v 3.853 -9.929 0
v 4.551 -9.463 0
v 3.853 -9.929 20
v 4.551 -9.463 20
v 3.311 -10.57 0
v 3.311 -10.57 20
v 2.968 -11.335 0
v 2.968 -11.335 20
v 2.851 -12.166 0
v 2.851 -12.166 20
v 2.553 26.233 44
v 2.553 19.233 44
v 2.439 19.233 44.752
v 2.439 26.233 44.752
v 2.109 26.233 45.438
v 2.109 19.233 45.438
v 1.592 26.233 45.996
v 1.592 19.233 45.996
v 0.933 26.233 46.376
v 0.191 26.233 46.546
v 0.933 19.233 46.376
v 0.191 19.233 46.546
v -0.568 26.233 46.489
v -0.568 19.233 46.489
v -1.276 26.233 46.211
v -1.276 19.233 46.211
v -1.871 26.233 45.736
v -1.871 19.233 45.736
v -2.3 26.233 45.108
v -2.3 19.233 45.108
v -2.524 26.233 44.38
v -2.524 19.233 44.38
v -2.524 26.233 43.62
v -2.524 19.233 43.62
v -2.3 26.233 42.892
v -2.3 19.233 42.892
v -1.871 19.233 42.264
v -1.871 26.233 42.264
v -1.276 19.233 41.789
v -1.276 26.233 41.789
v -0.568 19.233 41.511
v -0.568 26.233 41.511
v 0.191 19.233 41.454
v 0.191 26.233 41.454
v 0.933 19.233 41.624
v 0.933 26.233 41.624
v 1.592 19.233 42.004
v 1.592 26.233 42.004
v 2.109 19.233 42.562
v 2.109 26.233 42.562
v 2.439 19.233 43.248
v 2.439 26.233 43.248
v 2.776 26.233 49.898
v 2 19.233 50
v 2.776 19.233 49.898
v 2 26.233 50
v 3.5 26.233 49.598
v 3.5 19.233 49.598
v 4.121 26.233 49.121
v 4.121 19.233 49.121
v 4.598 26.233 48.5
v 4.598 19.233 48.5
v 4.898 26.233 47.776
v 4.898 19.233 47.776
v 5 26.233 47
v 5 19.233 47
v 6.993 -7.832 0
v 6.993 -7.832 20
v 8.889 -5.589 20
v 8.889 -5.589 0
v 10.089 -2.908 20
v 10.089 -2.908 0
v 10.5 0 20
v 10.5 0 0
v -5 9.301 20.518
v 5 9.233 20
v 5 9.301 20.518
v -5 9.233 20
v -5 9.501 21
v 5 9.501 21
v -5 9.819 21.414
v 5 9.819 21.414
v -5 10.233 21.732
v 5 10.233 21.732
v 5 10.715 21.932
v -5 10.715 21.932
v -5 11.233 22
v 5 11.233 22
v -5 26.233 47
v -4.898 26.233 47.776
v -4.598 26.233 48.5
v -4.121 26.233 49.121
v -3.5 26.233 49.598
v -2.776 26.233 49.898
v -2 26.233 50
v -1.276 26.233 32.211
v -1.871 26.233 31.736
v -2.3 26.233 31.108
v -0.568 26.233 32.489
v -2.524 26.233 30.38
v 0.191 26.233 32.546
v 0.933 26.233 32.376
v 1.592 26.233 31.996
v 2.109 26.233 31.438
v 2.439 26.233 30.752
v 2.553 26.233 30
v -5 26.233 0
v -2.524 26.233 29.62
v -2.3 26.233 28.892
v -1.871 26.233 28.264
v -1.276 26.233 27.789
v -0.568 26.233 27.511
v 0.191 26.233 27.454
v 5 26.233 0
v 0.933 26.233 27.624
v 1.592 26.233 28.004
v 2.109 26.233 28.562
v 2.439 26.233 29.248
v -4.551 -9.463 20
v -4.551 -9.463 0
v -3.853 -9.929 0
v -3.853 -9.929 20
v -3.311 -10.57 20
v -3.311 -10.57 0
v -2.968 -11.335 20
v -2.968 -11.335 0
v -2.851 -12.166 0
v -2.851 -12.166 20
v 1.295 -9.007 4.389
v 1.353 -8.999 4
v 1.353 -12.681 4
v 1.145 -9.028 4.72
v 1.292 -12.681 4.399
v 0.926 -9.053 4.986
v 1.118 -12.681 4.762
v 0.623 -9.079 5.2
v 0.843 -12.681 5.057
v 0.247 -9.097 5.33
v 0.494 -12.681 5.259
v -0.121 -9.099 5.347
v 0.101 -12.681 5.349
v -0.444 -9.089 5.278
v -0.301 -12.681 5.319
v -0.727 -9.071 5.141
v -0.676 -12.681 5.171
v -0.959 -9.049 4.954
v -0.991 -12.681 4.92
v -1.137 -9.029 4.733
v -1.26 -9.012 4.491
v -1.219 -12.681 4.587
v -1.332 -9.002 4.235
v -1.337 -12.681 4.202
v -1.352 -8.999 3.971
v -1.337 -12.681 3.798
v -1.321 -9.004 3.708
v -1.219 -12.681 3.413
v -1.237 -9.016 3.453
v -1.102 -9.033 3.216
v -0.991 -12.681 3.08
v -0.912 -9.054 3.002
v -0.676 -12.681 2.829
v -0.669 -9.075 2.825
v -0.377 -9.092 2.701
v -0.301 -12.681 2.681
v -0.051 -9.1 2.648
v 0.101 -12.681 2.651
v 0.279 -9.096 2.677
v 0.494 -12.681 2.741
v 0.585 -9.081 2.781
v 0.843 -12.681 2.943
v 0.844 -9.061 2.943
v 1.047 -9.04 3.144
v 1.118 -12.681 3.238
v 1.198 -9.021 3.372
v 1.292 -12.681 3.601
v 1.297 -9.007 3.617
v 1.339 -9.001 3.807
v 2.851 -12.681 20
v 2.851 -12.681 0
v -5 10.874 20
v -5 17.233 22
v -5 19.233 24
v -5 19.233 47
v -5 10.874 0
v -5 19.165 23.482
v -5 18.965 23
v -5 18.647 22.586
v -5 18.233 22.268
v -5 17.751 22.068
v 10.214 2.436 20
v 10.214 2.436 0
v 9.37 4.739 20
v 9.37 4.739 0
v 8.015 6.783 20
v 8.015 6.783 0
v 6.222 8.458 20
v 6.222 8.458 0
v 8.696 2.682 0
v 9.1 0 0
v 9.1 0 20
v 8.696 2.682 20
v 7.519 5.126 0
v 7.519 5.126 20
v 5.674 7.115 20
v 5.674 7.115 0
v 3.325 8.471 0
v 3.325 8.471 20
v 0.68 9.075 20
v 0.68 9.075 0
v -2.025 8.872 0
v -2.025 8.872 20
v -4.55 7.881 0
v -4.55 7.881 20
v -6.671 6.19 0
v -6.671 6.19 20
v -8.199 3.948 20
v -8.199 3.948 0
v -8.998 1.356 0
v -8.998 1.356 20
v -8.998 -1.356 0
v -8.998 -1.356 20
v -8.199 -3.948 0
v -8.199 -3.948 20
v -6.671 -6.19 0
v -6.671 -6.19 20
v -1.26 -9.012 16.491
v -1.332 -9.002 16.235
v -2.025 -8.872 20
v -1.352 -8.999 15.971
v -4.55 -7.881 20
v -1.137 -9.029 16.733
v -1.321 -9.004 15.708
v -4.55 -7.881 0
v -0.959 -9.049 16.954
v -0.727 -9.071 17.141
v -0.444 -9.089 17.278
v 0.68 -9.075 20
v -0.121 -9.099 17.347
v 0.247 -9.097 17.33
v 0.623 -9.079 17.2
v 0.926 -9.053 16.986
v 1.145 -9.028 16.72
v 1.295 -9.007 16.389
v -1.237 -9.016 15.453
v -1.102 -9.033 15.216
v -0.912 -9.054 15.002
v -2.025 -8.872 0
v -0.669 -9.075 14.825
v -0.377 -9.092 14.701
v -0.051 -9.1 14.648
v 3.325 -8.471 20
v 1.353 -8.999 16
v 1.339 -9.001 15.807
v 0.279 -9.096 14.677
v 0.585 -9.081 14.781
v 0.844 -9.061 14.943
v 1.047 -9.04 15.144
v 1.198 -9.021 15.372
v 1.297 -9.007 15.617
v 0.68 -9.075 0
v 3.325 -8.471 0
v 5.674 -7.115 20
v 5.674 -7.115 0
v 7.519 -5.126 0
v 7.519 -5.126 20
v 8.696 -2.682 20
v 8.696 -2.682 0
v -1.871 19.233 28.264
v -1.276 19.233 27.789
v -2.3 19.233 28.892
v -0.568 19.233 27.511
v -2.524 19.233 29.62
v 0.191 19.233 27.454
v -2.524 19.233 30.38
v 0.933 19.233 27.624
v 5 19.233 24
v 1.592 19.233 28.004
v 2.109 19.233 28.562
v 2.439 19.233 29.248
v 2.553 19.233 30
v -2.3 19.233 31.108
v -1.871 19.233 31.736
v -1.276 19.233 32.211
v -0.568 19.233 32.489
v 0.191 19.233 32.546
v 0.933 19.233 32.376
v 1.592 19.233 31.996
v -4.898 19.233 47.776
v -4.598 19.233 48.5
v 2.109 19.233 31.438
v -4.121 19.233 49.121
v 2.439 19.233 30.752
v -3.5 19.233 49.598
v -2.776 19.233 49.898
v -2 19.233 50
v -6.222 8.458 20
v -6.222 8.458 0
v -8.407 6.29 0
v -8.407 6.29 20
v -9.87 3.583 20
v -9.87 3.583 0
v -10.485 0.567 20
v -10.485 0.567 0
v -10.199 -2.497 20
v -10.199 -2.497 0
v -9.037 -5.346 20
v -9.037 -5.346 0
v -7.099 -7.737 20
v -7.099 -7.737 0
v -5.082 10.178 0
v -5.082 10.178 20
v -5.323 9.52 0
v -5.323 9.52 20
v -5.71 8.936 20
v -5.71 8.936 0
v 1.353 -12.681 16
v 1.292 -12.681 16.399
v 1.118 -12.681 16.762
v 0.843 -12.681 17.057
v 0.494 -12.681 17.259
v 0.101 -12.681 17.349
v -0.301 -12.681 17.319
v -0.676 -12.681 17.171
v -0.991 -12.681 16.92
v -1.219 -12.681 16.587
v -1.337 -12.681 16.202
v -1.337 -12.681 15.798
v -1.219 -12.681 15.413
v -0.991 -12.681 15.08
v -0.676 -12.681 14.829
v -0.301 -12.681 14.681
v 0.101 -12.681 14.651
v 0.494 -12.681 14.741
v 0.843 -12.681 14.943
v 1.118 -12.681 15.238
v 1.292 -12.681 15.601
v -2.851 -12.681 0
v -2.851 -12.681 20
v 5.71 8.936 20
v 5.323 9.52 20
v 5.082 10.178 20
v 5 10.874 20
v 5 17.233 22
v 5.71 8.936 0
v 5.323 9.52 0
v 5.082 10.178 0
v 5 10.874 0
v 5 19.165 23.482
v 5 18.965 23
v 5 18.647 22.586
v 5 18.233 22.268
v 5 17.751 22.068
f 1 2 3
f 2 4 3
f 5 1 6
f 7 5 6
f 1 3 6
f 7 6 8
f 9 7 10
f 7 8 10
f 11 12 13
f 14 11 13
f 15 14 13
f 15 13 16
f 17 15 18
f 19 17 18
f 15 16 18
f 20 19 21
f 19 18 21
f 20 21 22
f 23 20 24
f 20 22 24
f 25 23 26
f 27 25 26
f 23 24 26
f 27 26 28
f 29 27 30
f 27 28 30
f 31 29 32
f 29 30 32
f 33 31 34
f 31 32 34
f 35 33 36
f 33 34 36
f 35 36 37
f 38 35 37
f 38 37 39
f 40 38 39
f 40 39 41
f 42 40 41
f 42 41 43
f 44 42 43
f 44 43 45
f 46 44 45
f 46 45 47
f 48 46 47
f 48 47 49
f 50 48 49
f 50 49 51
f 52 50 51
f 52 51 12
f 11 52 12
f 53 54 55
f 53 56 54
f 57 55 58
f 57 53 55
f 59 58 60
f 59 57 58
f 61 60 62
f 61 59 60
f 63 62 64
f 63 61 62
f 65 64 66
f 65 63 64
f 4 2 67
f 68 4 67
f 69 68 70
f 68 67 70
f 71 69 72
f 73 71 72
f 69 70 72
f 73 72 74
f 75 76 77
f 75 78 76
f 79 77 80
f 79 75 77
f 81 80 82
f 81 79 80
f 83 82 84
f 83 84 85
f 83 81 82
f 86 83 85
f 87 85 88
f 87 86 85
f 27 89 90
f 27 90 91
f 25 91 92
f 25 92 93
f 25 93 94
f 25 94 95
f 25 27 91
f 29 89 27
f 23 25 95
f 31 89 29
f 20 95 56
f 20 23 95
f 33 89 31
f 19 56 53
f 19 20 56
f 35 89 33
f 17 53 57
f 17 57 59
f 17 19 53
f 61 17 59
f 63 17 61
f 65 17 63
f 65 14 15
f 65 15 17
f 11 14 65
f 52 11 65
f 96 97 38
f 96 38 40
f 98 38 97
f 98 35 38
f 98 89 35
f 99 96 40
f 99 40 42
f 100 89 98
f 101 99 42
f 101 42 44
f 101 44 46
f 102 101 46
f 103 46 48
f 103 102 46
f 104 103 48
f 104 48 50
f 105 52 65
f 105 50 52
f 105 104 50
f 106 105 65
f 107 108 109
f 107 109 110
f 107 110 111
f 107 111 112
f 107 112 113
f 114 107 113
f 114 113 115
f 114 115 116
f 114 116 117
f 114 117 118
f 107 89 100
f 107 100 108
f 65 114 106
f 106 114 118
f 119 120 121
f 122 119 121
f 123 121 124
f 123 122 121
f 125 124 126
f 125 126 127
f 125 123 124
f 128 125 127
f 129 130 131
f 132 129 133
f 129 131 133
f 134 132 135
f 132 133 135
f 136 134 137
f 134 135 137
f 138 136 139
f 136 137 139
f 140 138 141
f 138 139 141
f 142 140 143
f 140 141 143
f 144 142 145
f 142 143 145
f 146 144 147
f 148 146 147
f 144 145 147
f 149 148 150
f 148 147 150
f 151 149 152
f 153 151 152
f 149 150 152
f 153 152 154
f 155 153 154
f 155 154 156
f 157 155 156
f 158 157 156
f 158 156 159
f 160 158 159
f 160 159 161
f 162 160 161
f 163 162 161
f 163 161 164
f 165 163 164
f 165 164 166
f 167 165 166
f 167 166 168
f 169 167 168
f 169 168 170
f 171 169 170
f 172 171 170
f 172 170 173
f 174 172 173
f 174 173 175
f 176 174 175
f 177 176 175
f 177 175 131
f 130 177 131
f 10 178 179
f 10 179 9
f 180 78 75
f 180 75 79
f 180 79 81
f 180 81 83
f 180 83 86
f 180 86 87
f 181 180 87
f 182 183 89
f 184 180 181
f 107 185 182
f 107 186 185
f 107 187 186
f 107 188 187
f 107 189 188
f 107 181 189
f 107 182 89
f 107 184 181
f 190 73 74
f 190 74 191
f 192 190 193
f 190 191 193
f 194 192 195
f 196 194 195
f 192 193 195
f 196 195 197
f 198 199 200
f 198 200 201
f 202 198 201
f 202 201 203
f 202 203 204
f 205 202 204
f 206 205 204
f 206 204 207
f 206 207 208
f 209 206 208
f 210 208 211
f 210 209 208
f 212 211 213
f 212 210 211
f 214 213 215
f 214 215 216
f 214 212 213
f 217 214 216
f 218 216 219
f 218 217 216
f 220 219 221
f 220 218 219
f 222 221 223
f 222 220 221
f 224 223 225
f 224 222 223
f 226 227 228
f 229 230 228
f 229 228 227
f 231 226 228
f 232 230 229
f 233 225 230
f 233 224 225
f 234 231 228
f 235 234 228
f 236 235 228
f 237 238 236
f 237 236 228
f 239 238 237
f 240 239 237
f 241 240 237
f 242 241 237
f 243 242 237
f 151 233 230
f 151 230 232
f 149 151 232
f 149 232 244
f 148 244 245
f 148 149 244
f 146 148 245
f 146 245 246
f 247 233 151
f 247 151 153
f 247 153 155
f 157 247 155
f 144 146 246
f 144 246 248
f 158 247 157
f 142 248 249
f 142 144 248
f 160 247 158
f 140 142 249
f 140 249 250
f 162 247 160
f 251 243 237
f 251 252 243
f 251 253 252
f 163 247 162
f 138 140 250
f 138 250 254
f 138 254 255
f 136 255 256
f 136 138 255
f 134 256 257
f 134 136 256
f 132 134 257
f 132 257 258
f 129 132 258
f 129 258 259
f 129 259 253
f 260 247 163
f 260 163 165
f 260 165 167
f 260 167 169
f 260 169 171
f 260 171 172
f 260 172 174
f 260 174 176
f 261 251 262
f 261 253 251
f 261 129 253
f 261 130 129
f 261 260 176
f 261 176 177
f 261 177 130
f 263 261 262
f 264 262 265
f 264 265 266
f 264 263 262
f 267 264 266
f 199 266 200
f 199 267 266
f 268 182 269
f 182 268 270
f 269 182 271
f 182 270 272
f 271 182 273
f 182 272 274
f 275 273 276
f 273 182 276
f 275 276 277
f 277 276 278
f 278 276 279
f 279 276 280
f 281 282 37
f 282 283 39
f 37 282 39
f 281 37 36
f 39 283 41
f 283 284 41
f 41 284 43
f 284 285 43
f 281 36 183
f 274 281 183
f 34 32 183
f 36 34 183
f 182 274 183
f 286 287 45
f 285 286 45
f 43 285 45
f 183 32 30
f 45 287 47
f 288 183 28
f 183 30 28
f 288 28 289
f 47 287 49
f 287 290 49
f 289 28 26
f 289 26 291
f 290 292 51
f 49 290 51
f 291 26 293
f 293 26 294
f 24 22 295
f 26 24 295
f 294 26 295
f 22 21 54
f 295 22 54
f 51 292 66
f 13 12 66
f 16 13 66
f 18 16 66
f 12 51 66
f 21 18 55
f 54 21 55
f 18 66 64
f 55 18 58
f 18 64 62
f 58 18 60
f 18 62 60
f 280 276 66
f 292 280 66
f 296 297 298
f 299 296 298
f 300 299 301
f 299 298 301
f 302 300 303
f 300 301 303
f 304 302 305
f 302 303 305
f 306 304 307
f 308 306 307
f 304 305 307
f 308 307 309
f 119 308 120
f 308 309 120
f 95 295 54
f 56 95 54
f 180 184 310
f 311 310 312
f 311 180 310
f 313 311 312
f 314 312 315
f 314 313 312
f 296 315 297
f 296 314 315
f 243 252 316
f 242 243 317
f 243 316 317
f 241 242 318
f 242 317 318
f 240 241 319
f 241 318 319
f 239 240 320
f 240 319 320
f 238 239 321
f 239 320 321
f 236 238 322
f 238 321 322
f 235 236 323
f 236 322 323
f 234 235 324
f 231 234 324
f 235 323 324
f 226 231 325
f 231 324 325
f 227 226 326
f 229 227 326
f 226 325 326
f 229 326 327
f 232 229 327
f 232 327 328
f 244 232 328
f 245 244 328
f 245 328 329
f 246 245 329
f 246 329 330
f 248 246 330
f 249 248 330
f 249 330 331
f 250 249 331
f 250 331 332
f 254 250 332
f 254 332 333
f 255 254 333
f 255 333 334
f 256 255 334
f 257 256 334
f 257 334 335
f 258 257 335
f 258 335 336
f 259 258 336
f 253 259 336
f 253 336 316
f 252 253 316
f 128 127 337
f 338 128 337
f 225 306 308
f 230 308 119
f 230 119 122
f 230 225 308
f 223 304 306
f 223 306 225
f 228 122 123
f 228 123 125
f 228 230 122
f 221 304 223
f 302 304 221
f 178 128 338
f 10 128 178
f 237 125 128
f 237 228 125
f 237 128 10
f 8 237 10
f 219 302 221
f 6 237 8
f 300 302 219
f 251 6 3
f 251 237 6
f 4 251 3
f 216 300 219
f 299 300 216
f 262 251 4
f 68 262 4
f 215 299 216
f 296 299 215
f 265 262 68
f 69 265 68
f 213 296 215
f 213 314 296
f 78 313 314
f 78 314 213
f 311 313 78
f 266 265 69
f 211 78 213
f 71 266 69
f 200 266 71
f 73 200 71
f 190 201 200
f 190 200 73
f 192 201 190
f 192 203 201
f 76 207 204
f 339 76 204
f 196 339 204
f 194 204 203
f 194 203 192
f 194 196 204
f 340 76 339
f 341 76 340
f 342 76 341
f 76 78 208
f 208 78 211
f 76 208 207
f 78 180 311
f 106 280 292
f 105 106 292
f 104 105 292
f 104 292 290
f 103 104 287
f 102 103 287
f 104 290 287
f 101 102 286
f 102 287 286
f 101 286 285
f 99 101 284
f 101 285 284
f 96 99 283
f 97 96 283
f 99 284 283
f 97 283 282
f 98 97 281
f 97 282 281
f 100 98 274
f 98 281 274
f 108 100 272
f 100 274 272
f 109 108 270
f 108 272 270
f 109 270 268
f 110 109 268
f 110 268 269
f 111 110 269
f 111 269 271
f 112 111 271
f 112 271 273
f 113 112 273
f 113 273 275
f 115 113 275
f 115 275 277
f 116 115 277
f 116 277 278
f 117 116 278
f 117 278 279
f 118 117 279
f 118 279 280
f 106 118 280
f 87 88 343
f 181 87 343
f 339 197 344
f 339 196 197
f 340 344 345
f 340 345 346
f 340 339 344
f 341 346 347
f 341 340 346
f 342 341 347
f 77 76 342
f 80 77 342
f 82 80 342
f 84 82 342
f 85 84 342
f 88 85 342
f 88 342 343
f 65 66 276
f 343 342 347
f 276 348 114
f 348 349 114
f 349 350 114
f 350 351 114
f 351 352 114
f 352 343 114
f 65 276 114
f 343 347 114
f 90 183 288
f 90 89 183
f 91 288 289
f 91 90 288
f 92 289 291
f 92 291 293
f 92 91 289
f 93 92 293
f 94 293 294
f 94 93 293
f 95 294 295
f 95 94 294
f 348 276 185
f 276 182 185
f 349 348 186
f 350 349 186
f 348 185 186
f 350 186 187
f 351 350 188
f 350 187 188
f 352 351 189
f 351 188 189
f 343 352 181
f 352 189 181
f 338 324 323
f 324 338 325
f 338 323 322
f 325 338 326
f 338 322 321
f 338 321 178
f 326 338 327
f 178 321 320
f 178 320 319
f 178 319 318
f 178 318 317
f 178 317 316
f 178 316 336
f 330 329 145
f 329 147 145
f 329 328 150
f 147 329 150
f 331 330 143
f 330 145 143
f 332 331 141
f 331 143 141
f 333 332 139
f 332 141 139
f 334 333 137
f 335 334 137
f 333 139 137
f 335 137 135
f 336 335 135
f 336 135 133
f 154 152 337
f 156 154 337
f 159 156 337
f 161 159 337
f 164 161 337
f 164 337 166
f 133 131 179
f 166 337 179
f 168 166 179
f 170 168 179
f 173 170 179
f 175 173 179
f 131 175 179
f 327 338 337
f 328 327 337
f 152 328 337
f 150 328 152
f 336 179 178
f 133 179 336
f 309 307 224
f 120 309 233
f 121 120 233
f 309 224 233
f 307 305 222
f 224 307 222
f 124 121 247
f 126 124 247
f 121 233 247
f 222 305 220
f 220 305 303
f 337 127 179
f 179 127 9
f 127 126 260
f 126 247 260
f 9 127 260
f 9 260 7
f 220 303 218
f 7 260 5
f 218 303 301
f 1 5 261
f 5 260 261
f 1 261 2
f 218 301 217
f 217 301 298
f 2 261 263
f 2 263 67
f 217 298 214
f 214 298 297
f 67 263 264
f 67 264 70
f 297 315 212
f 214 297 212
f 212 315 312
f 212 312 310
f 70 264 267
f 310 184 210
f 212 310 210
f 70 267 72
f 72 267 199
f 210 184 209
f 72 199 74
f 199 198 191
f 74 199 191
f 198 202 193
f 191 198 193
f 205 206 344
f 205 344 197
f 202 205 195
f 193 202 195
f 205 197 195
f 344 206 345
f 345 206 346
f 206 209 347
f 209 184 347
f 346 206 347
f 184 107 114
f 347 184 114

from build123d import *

# Parameters (mm, degrees)
F0_R      = 9.1
F1_DEPTH  = 20
F2_W      = 10
F2_H      = 17
F3_DEPTH  = 30
F4_W      = 10
F4_H      = 28
F5_DEPTH  = 25.4
F6_R      = 3
F7_R      = 1.99999
F8_R      = 2.5527
F9_DEPTH  = 7.001
F10_R     = 1.35255
F11_DEPTH = 3.6831519111


# Not quite as in the source:
# - a fillet or chamfer is up to 0.001 mm smaller than in the source, because OpenCascade refuses the exact size


with BuildPart() as f1:
    # F0 (on Top) → F1 (new body)
    with BuildSketch(Plane.XY):
        with BuildLine():
            ThreePointArc((2.8507034294, -10.1056167529), (8.3720483159, -6.3370976792), (10.5, 0))
            ThreePointArc((10.5, 0), (9.0208092763, 5.3735463151), (5, 9.2330926563))
            Line((5, 9.2330926563), (-5, 9.2330926563))
            ThreePointArc((-5, 9.2330926563), (-10.4357465707, -1.1598247764), (-2.8507034294, -10.1056167529))
            Line((-2.8507034294, -10.1056167529), (2.8507034294, -10.1056167529))
        make_face()
        Circle(F0_R, mode=Mode.SUBTRACT)
        with BuildLine():
            Line((-5, 9.2330926563), (5, 9.2330926563))
            ThreePointArc((5, 9.2330926563), (0, 10.5), (-5, 9.2330926563))
        make_face()
        with BuildLine():
            ThreePointArc((-5, 9.2330926563), (0, 10.5), (5, 9.2330926563))
            Line((5, 9.2330926563), (5, 26.2330926563))
            Line((5, 26.2330926563), (-5, 26.2330926563))
            Line((-5, 26.2330926563), (-5, 9.2330926563))
        make_face()
        with BuildLine():
            Line((2.8507034294, -12.6810744405), (2.8507034294, -10.1056167529))
            ThreePointArc((2.8507034294, -10.1056167529), (0, -10.5), (-2.8507034294, -10.1056167529))
            Line((-2.8507034294, -10.1056167529), (-2.8507034294, -12.6810744405))
            Line((-2.8507034294, -12.6810744405), (2.8507034294, -12.6810744405))
        make_face()
        with BuildLine():
            ThreePointArc((-2.8507034294, -10.1056167529), (0, -10.5), (2.8507034294, -10.1056167529))
            Line((2.8507034294, -10.1056167529), (-2.8507034294, -10.1056167529))
        make_face()
    extrude(amount=F1_DEPTH)

    # F2 (on face) → F3 (join)
    with BuildSketch(Plane.XY.offset(20)):
        with Locations((0, 17.7330926563)):
            Rectangle(F2_W, F2_H)
    extrude(amount=F3_DEPTH)

    # F4 (on face) → F5 (cut)
    with BuildSketch(Plane.YZ.offset(5)):
        with Locations((14.2330926563, 36)):
            Rectangle(F4_W, F4_H)
    extrude(amount=-F5_DEPTH, mode=Mode.SUBTRACT)

    # F6
    f6_edges = [f1.edges().sort_by_distance(p)[0] for p in [
        (5, 9.233093, 10),
        (-5, 9.233093, 10),
        (-5, 22.733093, 50),
        (5, 22.733093, 50),
        (2.850703, -10.105617, 10),
        (-2.850703, -10.105617, 10),
    ]]
    fillet(f6_edges, radius=F6_R)

    # F7 (radius 2 in the source; OpenCascade refuses exactly that, so slightly less here)
    f7_edges = [f1.edges().sort_by_distance(p)[0] for p in [
        (0, 9.233093, 22),
        (0, 19.233093, 22),
    ]]
    fillet(f7_edges, radius=F7_R)

    # F8 (on face) → F9 (cut, through all)
    with BuildSketch(Plane.XZ.offset(-19.2330926563)):
        with Locations((0, 44)):
            Circle(F8_R)
        with Locations((0, 30)):
            Circle(F8_R)
    extrude(amount=-F9_DEPTH, mode=Mode.SUBTRACT)

    # F10 (on face) → F11 (cut, through all)
    with BuildSketch(Plane.XZ.offset(12.6810744405)):
        with Locations((0, 16)):
            Circle(F10_R)
        with Locations((0, 4)):
            Circle(F10_R)
    extrude(amount=-F11_DEPTH, mode=Mode.SUBTRACT)


solid = f1.part
